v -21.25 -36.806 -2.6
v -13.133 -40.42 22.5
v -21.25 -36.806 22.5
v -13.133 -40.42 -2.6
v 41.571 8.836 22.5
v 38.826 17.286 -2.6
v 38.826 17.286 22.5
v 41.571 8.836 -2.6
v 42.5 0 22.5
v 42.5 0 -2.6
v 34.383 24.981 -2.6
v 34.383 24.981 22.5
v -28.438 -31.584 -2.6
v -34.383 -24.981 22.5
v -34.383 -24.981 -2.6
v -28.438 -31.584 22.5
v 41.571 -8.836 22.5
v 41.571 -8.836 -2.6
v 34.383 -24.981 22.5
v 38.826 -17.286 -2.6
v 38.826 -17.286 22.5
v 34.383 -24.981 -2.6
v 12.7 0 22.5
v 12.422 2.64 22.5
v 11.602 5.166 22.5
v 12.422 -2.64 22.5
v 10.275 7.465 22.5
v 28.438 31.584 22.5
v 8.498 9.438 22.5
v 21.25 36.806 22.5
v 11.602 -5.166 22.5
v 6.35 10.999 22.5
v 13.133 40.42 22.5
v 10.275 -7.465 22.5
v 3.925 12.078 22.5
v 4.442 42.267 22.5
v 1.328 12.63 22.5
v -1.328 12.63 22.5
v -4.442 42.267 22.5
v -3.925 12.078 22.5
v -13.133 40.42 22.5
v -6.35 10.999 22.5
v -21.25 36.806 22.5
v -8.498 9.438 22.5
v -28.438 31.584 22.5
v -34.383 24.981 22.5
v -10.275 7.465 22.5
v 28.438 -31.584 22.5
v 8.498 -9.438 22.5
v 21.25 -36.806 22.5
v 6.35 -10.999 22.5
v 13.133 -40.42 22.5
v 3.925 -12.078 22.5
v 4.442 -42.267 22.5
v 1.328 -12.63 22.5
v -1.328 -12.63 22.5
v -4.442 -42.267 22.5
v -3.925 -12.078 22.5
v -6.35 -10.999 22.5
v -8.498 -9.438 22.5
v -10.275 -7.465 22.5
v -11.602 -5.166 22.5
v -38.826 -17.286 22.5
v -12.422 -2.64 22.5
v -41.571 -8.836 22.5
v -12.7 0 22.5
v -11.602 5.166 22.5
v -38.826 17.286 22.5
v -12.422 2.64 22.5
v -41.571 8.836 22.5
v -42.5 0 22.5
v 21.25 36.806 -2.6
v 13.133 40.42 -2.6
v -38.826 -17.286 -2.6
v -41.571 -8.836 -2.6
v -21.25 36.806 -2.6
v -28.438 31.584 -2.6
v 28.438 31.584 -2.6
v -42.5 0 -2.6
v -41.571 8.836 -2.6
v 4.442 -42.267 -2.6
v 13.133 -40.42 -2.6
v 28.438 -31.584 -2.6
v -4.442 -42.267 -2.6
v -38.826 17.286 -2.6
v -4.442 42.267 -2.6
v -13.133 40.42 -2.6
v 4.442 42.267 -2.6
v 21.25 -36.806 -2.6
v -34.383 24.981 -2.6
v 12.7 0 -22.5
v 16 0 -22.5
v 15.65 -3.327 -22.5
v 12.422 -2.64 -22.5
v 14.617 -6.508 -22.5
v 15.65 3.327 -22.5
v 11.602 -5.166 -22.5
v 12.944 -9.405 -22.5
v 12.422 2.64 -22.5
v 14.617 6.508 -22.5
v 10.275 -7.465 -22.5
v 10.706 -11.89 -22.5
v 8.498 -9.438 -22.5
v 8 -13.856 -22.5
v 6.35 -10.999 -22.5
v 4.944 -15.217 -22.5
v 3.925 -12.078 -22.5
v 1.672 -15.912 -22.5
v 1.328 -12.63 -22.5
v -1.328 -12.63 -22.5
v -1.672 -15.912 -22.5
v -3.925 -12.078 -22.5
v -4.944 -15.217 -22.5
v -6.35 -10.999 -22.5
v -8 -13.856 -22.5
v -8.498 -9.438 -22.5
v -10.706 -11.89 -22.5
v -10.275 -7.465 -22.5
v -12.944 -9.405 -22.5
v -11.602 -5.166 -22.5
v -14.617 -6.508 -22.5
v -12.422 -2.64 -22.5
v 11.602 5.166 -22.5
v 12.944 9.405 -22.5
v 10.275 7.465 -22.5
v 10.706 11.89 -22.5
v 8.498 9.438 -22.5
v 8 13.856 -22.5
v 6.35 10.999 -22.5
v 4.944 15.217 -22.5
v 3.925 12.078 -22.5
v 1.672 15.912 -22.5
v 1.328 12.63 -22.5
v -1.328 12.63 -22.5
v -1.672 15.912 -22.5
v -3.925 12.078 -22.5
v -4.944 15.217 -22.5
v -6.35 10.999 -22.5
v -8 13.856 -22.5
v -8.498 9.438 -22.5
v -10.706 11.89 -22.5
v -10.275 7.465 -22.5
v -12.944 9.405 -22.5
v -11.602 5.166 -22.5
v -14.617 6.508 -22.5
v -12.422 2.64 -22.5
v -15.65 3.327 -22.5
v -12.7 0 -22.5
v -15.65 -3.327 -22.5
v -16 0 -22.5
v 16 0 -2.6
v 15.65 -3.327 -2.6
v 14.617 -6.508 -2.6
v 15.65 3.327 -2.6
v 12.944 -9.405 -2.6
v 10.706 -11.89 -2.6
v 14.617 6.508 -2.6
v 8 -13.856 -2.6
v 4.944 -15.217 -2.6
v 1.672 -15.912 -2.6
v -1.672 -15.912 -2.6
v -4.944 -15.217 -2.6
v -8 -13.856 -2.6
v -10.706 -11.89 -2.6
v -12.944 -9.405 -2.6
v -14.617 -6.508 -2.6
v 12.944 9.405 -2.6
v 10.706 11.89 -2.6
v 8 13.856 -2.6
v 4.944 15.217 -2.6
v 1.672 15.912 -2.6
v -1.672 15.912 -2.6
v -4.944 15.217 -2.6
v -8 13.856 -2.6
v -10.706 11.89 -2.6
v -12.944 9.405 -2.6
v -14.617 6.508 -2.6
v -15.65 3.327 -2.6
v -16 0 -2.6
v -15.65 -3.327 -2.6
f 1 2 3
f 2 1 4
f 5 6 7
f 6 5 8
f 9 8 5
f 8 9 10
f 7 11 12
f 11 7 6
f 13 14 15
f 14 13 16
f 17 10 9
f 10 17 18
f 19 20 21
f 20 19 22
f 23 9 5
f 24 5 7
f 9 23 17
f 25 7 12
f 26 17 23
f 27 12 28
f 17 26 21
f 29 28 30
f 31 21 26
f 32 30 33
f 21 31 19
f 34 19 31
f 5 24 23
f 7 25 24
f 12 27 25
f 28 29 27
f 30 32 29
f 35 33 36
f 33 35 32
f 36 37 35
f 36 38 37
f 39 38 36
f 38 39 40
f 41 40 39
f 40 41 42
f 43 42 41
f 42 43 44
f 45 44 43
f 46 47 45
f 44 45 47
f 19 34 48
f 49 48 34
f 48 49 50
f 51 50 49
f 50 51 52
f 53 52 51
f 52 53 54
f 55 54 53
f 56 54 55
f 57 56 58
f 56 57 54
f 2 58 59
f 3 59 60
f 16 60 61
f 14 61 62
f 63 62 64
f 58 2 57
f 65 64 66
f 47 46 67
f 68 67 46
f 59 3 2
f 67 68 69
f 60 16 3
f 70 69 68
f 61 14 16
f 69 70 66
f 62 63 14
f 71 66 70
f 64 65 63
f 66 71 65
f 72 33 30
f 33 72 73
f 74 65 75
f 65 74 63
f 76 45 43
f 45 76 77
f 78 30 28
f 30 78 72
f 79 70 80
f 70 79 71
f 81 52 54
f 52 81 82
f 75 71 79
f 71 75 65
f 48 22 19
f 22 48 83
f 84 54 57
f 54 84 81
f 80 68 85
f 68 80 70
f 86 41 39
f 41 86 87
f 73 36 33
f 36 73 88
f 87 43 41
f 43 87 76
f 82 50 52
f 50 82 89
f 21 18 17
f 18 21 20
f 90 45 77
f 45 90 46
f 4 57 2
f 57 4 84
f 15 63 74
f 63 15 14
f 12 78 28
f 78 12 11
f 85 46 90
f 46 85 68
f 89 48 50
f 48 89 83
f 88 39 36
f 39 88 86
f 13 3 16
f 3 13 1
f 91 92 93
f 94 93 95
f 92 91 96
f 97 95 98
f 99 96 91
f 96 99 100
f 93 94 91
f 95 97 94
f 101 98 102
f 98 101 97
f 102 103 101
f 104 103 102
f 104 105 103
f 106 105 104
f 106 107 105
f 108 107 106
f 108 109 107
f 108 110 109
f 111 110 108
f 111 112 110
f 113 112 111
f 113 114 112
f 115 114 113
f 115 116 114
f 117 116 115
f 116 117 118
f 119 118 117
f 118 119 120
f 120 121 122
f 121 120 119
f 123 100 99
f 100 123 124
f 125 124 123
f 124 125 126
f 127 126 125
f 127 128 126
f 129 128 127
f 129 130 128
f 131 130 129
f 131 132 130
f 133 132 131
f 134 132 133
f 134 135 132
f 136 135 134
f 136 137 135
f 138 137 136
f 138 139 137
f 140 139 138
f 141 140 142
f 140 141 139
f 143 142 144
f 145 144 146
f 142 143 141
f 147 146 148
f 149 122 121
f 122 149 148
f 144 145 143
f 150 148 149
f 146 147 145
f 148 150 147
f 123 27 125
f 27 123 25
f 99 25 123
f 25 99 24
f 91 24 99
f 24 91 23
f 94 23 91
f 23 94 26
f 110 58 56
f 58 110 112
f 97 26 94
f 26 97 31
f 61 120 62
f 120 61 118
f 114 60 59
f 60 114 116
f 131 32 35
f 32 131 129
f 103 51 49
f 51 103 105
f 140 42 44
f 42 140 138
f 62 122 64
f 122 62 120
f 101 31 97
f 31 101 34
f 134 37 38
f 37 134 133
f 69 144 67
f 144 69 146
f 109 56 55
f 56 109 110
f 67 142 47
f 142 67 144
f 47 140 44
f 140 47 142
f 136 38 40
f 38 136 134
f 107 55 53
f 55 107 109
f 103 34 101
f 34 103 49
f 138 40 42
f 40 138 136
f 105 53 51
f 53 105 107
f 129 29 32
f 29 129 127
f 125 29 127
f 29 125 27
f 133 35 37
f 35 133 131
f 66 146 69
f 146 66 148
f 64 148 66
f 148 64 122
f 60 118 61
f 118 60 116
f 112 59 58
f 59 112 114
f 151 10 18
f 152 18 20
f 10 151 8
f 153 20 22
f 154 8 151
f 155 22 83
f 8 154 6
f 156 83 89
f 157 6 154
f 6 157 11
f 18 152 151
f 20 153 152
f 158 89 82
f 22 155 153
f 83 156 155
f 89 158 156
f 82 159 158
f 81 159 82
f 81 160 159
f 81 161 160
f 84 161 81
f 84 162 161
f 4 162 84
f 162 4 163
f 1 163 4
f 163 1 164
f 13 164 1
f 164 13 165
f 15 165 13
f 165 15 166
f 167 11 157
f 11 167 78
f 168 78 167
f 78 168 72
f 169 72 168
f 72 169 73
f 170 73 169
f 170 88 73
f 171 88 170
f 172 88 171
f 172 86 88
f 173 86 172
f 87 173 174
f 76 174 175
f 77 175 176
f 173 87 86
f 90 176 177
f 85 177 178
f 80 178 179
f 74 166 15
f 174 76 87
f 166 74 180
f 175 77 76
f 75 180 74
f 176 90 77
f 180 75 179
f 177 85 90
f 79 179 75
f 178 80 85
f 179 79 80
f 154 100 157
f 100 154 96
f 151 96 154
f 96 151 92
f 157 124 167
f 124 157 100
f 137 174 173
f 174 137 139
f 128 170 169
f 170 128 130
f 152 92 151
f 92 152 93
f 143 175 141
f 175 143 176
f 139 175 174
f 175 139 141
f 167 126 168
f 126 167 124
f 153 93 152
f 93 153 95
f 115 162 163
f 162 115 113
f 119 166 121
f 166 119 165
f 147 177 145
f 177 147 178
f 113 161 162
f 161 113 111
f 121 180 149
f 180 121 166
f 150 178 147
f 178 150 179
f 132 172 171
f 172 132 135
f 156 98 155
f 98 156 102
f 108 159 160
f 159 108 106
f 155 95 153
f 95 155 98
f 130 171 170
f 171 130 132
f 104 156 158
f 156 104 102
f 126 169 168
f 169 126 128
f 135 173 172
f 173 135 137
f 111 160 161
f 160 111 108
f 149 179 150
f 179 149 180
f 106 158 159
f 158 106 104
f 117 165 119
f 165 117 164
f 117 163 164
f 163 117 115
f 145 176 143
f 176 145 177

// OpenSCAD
total_len=45;
diam_ex1 = 85;
diam_ex2 = 32;
diametro_interior = 25.4;
diametro_cabeza_chicote = 5;
profundidad_ranura_chic = 2;
l1=20;

radio_interior = diametro_interior / 2;
radio_ex1 = diam_ex1 / 2;
radio_ex2 = diam_ex2 / 2;

module barra_hueca() {
    difference() {
        cylinder(h=total_len,   r=radio_ex1, center=true);
        cylinder(h=total_len+0.1, r=radio_interior, center=true);
    }
}

module barra_hueca_cilindrada1() {
    translate([0,0,-0.1-(total_len/2)+(l1/2)])
    difference() {
        cylinder(h=l1,   r=radio_ex1+0.1, center=true);
        cylinder(h=l1+0.1, r=radio_ex2, center=true);
    }
}


module all() {
    difference(){
       barra_hueca();
       barra_hueca_cilindrada1();
    }
}

all();
